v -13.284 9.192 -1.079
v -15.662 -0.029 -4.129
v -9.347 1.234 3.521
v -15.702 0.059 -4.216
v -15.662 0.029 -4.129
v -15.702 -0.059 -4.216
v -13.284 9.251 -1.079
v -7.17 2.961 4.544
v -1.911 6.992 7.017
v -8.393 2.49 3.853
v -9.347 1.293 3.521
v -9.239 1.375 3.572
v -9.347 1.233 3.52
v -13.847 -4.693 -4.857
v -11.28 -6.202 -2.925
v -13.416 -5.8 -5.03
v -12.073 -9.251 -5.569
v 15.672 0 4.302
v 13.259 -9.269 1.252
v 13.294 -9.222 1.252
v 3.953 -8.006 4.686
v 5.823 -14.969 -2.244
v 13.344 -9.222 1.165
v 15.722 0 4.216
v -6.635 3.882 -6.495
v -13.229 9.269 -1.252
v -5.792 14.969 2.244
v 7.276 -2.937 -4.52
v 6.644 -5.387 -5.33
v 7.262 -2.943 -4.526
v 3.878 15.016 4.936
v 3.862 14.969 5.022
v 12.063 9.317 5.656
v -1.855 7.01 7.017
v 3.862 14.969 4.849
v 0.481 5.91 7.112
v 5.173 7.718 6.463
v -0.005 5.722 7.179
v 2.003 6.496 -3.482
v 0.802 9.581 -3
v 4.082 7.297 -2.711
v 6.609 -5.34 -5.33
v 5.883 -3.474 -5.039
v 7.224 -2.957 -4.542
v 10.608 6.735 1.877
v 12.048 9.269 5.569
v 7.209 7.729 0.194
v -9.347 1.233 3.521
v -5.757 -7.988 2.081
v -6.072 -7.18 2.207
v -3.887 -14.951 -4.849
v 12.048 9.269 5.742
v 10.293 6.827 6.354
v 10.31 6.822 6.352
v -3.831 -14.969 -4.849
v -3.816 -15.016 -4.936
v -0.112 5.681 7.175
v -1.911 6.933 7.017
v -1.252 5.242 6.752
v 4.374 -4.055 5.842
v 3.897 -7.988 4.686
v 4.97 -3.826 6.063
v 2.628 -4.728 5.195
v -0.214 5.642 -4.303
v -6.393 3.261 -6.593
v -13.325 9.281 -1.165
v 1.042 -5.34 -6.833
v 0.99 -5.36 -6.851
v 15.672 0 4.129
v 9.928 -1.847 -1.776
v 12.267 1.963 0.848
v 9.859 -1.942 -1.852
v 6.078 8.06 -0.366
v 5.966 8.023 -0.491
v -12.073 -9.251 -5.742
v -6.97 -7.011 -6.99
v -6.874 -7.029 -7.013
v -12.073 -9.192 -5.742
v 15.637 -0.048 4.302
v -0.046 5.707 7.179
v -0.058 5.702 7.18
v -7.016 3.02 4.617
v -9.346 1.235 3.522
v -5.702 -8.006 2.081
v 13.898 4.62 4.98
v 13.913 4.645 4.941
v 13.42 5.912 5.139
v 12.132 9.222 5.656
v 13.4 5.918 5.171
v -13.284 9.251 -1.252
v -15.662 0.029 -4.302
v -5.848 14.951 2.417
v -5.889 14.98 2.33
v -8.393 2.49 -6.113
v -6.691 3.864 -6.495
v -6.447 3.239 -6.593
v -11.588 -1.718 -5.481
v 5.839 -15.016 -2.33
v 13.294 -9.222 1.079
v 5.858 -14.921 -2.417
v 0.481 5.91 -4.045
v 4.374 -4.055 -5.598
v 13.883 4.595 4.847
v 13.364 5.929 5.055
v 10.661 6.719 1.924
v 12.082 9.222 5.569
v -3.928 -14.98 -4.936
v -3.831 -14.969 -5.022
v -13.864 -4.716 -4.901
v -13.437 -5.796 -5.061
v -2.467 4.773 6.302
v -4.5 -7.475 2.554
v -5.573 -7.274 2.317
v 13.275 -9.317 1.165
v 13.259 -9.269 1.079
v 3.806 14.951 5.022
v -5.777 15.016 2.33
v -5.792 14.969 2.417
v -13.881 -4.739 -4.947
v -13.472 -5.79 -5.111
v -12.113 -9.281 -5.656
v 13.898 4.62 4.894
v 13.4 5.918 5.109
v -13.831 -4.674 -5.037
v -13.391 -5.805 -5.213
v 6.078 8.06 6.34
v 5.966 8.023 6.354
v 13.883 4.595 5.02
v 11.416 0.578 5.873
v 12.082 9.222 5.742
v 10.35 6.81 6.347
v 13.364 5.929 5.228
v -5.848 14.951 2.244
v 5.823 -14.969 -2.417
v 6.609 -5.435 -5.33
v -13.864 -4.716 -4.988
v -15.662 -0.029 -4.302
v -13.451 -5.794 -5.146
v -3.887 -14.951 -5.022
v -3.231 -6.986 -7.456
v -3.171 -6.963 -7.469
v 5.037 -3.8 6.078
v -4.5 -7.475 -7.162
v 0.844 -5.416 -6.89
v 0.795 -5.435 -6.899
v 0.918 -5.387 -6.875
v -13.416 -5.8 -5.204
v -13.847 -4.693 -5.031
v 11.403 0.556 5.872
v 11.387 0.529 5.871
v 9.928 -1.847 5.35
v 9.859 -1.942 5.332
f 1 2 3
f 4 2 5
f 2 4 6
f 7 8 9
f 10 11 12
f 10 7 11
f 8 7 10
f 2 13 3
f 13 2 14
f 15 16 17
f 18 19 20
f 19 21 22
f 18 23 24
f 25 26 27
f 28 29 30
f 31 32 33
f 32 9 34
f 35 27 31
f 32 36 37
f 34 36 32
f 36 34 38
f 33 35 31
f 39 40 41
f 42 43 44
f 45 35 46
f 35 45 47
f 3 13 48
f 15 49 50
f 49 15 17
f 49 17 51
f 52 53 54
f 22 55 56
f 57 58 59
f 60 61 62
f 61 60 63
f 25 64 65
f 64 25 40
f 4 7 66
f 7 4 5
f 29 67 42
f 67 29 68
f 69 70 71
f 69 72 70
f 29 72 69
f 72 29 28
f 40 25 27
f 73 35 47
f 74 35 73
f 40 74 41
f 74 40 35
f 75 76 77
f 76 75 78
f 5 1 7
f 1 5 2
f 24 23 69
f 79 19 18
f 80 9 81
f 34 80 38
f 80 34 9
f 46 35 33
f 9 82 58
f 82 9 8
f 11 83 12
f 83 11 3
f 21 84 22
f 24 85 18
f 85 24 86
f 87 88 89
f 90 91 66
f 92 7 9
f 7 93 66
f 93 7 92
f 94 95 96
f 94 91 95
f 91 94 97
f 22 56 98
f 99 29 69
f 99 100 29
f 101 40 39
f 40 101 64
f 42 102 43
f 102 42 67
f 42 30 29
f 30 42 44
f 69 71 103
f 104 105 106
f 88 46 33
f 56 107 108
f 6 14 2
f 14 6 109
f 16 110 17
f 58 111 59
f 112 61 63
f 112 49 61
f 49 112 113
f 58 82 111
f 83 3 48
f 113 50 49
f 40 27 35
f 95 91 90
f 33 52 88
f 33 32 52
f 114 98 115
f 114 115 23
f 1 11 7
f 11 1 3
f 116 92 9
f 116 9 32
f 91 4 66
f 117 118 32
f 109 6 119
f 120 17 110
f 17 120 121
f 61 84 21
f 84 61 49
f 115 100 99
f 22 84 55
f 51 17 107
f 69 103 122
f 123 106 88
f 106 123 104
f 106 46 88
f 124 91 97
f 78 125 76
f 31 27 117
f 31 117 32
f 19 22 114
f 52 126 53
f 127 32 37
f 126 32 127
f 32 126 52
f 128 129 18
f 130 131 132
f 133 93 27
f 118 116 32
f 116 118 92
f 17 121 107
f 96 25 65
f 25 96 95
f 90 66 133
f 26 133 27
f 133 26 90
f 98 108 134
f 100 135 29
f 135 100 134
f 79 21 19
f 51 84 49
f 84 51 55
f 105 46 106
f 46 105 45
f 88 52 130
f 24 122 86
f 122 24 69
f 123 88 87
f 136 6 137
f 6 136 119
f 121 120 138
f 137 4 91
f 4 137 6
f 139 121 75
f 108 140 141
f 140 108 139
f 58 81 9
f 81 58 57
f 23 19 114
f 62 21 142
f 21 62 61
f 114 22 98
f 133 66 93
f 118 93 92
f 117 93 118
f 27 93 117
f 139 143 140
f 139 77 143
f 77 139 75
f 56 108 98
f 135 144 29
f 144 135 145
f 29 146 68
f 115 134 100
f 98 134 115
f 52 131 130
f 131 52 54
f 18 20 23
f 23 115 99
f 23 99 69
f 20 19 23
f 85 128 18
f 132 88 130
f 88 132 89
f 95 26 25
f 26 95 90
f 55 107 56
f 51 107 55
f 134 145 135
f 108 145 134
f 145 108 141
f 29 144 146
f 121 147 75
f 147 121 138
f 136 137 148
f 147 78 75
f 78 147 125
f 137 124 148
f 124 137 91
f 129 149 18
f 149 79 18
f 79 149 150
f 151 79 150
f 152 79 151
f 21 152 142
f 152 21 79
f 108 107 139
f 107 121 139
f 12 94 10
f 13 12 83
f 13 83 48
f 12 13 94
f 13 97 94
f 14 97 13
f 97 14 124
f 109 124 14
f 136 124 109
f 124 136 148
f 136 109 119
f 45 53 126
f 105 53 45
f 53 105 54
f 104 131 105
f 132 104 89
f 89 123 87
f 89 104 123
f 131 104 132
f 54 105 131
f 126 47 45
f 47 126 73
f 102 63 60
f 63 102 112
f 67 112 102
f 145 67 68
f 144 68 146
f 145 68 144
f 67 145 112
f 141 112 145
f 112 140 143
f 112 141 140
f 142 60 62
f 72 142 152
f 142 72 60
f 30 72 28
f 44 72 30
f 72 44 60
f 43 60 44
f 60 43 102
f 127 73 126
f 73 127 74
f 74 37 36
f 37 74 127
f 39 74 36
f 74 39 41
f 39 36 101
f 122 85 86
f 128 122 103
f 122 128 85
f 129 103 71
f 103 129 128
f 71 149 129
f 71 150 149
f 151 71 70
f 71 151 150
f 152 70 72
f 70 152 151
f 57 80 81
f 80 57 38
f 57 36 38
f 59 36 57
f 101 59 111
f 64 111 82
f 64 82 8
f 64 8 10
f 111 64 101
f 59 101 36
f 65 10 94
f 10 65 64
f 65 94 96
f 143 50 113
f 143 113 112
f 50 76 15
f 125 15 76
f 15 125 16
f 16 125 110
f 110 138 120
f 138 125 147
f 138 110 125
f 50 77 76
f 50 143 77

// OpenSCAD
// Auto-generated OpenSCAD file

    inner_points = 10*[[1.4359011870482463, 0.5533730837177137, -0.5000000000000805], [-1.4359011870482463, -0.5533730837177137, 0.5000000000000805], [0.8874357380822848, 0.34200337419673843, 1.3090169943748977], [1.483420692140161e-13, -1.4966410443445797e-13, 1.618033988749895], [-1.483420692140161e-13, 1.4966410443445797e-13, -1.618033988749895], [-0.8874357380822848, -0.34200337419673843, -1.3090169943748977], [1.4359011870483378, 0.5533730837176212, 0.4999999999999195], [-0.887435738082045, -0.3420033741969806, 1.3090169943749972], [0.887435738082045, 0.3420033741969806, -1.3090169943749972], [-1.4359011870483378, -0.5533730837176212, -0.4999999999999195], [0.05622638989055023, 0.5850898186537883, 0.8090169943749964], [0.434336020988879, -0.39603500310477363, 0.809016994374871], [0.6046918388566034, 0.7964595281746711, 1.8207657603852567e-14], [0.9828014699549321, -0.18466529358389083, -1.0721978860317449e-13], [-0.8312093481916429, 0.2430864444569574, 0.5000000000000987], [-0.45309971709331415, -0.7380383773016045, 0.49999999999997324], [0.05622638989040191, 0.5850898186539379, -0.8090169943748985], [0.4343360209887307, -0.3960350031046239, -0.809016994375024], [-0.8312093481917346, 0.24308644445704983, -0.4999999999999013], [-0.4530997170934058, -0.738038377301512, -0.5000000000000268]];

    outer_points = 10*[[-1.562151832989105, 0.0, -0.42156332791014234], [1.562151832989105, 0.0, 0.42156332791014234], [-0.5807729208038567, 1.4921233423461835, 0.23303376243906446], [0.3846900075713595, 1.4921233423461835, 0.4935742274980496], [-0.3846900075713595, -1.4921233423461835, -0.4935742274980496], [0.5807729208038567, -1.4921233423461835, -0.23303376243906446], [-1.3244003331775505, 0.9221829409770366, -0.11651767934537474], [1.2032144281867707, 0.9221829409770366, 0.5655861136237528], [-1.2032144281867707, -0.9221829409770366, -0.5655861136237528], [1.3244003331775505, -0.9221829409770366, 0.11651767934537474], [-0.18701174725268985, 0.6962659651294776, 0.692993731711776], [0.07861977866300407, 0.9533850298427866, -0.29133471347343615], [-0.9306391596263837, 0.12632556376033077, 0.34344228992733694], [-0.6650076337106898, 0.3834446284736398, -0.6408861552578753], [0.6315126733627214, 0.12632556376033077, 0.7650056178374792], [0.8971441992784153, 0.3834446284736398, -0.21932282734773292], [-0.5717017548240494, -0.7958573772167059, 0.19941950421372653], [-0.3060702289083555, -0.5387383125033969, -0.7849089409714857], [0.3937611735511668, -0.7958573772167059, 0.45995996927271166], [0.6593926994668606, -0.5387383125033969, -0.5243684759125006]];

    // Convex hull for inner set (I)
    module inner_hull() {
        hull() {
            for (p = inner_points) {
                translate(p) sphere(r=0.1);
            }
        }
    }

    // Convex hull for outer set (O) minus inner hull (O \ I)
    module outer_minus_inner() {
        difference() {
            hull() {
                for (p = outer_points) {
                    translate(p) sphere(r=0.1);
                }
            }
            inner_hull(); // Subtract inner hull
        }
    }

    // Convex hull for outer set (O) minus all translated inner hulls
    module outer_minus_AllTranslationInner() {
        difference() {
            hull() {
                for (p = outer_points) {
                    translate(p) sphere(r=0.1);
                }
            }
            hull() {
                translate([0,0,50]) inner_hull();
                translate([0,0,-50]) inner_hull();
            }; // Subtract translated inner hulls
        }
    }

    // Difference between outer_minus_inner and outer_minus_AllTranslationInner
    module outer_minus_inner_diff() {
        difference() {
            // Outer minus inner
            difference() {
                hull() {
                    for (p = outer_points) {
                        translate(p) sphere(r=0.1);
                    }
                }
                inner_hull();
            }

            // Subtract Outer minus AllTranslationInner
            difference() {
                hull() {
                    for (p = outer_points) {
                        translate(p) sphere(r=0.1);
                    }
                }
                hull() {
                    translate([0,0,50]) inner_hull();
                    translate([0,0,-50]) inner_hull();
                };
            }
        }
    }

    // Rendering all with colors applied
    color([0, 1, 0, 1]) outer_minus_AllTranslationInner(); // Opaque green
    
